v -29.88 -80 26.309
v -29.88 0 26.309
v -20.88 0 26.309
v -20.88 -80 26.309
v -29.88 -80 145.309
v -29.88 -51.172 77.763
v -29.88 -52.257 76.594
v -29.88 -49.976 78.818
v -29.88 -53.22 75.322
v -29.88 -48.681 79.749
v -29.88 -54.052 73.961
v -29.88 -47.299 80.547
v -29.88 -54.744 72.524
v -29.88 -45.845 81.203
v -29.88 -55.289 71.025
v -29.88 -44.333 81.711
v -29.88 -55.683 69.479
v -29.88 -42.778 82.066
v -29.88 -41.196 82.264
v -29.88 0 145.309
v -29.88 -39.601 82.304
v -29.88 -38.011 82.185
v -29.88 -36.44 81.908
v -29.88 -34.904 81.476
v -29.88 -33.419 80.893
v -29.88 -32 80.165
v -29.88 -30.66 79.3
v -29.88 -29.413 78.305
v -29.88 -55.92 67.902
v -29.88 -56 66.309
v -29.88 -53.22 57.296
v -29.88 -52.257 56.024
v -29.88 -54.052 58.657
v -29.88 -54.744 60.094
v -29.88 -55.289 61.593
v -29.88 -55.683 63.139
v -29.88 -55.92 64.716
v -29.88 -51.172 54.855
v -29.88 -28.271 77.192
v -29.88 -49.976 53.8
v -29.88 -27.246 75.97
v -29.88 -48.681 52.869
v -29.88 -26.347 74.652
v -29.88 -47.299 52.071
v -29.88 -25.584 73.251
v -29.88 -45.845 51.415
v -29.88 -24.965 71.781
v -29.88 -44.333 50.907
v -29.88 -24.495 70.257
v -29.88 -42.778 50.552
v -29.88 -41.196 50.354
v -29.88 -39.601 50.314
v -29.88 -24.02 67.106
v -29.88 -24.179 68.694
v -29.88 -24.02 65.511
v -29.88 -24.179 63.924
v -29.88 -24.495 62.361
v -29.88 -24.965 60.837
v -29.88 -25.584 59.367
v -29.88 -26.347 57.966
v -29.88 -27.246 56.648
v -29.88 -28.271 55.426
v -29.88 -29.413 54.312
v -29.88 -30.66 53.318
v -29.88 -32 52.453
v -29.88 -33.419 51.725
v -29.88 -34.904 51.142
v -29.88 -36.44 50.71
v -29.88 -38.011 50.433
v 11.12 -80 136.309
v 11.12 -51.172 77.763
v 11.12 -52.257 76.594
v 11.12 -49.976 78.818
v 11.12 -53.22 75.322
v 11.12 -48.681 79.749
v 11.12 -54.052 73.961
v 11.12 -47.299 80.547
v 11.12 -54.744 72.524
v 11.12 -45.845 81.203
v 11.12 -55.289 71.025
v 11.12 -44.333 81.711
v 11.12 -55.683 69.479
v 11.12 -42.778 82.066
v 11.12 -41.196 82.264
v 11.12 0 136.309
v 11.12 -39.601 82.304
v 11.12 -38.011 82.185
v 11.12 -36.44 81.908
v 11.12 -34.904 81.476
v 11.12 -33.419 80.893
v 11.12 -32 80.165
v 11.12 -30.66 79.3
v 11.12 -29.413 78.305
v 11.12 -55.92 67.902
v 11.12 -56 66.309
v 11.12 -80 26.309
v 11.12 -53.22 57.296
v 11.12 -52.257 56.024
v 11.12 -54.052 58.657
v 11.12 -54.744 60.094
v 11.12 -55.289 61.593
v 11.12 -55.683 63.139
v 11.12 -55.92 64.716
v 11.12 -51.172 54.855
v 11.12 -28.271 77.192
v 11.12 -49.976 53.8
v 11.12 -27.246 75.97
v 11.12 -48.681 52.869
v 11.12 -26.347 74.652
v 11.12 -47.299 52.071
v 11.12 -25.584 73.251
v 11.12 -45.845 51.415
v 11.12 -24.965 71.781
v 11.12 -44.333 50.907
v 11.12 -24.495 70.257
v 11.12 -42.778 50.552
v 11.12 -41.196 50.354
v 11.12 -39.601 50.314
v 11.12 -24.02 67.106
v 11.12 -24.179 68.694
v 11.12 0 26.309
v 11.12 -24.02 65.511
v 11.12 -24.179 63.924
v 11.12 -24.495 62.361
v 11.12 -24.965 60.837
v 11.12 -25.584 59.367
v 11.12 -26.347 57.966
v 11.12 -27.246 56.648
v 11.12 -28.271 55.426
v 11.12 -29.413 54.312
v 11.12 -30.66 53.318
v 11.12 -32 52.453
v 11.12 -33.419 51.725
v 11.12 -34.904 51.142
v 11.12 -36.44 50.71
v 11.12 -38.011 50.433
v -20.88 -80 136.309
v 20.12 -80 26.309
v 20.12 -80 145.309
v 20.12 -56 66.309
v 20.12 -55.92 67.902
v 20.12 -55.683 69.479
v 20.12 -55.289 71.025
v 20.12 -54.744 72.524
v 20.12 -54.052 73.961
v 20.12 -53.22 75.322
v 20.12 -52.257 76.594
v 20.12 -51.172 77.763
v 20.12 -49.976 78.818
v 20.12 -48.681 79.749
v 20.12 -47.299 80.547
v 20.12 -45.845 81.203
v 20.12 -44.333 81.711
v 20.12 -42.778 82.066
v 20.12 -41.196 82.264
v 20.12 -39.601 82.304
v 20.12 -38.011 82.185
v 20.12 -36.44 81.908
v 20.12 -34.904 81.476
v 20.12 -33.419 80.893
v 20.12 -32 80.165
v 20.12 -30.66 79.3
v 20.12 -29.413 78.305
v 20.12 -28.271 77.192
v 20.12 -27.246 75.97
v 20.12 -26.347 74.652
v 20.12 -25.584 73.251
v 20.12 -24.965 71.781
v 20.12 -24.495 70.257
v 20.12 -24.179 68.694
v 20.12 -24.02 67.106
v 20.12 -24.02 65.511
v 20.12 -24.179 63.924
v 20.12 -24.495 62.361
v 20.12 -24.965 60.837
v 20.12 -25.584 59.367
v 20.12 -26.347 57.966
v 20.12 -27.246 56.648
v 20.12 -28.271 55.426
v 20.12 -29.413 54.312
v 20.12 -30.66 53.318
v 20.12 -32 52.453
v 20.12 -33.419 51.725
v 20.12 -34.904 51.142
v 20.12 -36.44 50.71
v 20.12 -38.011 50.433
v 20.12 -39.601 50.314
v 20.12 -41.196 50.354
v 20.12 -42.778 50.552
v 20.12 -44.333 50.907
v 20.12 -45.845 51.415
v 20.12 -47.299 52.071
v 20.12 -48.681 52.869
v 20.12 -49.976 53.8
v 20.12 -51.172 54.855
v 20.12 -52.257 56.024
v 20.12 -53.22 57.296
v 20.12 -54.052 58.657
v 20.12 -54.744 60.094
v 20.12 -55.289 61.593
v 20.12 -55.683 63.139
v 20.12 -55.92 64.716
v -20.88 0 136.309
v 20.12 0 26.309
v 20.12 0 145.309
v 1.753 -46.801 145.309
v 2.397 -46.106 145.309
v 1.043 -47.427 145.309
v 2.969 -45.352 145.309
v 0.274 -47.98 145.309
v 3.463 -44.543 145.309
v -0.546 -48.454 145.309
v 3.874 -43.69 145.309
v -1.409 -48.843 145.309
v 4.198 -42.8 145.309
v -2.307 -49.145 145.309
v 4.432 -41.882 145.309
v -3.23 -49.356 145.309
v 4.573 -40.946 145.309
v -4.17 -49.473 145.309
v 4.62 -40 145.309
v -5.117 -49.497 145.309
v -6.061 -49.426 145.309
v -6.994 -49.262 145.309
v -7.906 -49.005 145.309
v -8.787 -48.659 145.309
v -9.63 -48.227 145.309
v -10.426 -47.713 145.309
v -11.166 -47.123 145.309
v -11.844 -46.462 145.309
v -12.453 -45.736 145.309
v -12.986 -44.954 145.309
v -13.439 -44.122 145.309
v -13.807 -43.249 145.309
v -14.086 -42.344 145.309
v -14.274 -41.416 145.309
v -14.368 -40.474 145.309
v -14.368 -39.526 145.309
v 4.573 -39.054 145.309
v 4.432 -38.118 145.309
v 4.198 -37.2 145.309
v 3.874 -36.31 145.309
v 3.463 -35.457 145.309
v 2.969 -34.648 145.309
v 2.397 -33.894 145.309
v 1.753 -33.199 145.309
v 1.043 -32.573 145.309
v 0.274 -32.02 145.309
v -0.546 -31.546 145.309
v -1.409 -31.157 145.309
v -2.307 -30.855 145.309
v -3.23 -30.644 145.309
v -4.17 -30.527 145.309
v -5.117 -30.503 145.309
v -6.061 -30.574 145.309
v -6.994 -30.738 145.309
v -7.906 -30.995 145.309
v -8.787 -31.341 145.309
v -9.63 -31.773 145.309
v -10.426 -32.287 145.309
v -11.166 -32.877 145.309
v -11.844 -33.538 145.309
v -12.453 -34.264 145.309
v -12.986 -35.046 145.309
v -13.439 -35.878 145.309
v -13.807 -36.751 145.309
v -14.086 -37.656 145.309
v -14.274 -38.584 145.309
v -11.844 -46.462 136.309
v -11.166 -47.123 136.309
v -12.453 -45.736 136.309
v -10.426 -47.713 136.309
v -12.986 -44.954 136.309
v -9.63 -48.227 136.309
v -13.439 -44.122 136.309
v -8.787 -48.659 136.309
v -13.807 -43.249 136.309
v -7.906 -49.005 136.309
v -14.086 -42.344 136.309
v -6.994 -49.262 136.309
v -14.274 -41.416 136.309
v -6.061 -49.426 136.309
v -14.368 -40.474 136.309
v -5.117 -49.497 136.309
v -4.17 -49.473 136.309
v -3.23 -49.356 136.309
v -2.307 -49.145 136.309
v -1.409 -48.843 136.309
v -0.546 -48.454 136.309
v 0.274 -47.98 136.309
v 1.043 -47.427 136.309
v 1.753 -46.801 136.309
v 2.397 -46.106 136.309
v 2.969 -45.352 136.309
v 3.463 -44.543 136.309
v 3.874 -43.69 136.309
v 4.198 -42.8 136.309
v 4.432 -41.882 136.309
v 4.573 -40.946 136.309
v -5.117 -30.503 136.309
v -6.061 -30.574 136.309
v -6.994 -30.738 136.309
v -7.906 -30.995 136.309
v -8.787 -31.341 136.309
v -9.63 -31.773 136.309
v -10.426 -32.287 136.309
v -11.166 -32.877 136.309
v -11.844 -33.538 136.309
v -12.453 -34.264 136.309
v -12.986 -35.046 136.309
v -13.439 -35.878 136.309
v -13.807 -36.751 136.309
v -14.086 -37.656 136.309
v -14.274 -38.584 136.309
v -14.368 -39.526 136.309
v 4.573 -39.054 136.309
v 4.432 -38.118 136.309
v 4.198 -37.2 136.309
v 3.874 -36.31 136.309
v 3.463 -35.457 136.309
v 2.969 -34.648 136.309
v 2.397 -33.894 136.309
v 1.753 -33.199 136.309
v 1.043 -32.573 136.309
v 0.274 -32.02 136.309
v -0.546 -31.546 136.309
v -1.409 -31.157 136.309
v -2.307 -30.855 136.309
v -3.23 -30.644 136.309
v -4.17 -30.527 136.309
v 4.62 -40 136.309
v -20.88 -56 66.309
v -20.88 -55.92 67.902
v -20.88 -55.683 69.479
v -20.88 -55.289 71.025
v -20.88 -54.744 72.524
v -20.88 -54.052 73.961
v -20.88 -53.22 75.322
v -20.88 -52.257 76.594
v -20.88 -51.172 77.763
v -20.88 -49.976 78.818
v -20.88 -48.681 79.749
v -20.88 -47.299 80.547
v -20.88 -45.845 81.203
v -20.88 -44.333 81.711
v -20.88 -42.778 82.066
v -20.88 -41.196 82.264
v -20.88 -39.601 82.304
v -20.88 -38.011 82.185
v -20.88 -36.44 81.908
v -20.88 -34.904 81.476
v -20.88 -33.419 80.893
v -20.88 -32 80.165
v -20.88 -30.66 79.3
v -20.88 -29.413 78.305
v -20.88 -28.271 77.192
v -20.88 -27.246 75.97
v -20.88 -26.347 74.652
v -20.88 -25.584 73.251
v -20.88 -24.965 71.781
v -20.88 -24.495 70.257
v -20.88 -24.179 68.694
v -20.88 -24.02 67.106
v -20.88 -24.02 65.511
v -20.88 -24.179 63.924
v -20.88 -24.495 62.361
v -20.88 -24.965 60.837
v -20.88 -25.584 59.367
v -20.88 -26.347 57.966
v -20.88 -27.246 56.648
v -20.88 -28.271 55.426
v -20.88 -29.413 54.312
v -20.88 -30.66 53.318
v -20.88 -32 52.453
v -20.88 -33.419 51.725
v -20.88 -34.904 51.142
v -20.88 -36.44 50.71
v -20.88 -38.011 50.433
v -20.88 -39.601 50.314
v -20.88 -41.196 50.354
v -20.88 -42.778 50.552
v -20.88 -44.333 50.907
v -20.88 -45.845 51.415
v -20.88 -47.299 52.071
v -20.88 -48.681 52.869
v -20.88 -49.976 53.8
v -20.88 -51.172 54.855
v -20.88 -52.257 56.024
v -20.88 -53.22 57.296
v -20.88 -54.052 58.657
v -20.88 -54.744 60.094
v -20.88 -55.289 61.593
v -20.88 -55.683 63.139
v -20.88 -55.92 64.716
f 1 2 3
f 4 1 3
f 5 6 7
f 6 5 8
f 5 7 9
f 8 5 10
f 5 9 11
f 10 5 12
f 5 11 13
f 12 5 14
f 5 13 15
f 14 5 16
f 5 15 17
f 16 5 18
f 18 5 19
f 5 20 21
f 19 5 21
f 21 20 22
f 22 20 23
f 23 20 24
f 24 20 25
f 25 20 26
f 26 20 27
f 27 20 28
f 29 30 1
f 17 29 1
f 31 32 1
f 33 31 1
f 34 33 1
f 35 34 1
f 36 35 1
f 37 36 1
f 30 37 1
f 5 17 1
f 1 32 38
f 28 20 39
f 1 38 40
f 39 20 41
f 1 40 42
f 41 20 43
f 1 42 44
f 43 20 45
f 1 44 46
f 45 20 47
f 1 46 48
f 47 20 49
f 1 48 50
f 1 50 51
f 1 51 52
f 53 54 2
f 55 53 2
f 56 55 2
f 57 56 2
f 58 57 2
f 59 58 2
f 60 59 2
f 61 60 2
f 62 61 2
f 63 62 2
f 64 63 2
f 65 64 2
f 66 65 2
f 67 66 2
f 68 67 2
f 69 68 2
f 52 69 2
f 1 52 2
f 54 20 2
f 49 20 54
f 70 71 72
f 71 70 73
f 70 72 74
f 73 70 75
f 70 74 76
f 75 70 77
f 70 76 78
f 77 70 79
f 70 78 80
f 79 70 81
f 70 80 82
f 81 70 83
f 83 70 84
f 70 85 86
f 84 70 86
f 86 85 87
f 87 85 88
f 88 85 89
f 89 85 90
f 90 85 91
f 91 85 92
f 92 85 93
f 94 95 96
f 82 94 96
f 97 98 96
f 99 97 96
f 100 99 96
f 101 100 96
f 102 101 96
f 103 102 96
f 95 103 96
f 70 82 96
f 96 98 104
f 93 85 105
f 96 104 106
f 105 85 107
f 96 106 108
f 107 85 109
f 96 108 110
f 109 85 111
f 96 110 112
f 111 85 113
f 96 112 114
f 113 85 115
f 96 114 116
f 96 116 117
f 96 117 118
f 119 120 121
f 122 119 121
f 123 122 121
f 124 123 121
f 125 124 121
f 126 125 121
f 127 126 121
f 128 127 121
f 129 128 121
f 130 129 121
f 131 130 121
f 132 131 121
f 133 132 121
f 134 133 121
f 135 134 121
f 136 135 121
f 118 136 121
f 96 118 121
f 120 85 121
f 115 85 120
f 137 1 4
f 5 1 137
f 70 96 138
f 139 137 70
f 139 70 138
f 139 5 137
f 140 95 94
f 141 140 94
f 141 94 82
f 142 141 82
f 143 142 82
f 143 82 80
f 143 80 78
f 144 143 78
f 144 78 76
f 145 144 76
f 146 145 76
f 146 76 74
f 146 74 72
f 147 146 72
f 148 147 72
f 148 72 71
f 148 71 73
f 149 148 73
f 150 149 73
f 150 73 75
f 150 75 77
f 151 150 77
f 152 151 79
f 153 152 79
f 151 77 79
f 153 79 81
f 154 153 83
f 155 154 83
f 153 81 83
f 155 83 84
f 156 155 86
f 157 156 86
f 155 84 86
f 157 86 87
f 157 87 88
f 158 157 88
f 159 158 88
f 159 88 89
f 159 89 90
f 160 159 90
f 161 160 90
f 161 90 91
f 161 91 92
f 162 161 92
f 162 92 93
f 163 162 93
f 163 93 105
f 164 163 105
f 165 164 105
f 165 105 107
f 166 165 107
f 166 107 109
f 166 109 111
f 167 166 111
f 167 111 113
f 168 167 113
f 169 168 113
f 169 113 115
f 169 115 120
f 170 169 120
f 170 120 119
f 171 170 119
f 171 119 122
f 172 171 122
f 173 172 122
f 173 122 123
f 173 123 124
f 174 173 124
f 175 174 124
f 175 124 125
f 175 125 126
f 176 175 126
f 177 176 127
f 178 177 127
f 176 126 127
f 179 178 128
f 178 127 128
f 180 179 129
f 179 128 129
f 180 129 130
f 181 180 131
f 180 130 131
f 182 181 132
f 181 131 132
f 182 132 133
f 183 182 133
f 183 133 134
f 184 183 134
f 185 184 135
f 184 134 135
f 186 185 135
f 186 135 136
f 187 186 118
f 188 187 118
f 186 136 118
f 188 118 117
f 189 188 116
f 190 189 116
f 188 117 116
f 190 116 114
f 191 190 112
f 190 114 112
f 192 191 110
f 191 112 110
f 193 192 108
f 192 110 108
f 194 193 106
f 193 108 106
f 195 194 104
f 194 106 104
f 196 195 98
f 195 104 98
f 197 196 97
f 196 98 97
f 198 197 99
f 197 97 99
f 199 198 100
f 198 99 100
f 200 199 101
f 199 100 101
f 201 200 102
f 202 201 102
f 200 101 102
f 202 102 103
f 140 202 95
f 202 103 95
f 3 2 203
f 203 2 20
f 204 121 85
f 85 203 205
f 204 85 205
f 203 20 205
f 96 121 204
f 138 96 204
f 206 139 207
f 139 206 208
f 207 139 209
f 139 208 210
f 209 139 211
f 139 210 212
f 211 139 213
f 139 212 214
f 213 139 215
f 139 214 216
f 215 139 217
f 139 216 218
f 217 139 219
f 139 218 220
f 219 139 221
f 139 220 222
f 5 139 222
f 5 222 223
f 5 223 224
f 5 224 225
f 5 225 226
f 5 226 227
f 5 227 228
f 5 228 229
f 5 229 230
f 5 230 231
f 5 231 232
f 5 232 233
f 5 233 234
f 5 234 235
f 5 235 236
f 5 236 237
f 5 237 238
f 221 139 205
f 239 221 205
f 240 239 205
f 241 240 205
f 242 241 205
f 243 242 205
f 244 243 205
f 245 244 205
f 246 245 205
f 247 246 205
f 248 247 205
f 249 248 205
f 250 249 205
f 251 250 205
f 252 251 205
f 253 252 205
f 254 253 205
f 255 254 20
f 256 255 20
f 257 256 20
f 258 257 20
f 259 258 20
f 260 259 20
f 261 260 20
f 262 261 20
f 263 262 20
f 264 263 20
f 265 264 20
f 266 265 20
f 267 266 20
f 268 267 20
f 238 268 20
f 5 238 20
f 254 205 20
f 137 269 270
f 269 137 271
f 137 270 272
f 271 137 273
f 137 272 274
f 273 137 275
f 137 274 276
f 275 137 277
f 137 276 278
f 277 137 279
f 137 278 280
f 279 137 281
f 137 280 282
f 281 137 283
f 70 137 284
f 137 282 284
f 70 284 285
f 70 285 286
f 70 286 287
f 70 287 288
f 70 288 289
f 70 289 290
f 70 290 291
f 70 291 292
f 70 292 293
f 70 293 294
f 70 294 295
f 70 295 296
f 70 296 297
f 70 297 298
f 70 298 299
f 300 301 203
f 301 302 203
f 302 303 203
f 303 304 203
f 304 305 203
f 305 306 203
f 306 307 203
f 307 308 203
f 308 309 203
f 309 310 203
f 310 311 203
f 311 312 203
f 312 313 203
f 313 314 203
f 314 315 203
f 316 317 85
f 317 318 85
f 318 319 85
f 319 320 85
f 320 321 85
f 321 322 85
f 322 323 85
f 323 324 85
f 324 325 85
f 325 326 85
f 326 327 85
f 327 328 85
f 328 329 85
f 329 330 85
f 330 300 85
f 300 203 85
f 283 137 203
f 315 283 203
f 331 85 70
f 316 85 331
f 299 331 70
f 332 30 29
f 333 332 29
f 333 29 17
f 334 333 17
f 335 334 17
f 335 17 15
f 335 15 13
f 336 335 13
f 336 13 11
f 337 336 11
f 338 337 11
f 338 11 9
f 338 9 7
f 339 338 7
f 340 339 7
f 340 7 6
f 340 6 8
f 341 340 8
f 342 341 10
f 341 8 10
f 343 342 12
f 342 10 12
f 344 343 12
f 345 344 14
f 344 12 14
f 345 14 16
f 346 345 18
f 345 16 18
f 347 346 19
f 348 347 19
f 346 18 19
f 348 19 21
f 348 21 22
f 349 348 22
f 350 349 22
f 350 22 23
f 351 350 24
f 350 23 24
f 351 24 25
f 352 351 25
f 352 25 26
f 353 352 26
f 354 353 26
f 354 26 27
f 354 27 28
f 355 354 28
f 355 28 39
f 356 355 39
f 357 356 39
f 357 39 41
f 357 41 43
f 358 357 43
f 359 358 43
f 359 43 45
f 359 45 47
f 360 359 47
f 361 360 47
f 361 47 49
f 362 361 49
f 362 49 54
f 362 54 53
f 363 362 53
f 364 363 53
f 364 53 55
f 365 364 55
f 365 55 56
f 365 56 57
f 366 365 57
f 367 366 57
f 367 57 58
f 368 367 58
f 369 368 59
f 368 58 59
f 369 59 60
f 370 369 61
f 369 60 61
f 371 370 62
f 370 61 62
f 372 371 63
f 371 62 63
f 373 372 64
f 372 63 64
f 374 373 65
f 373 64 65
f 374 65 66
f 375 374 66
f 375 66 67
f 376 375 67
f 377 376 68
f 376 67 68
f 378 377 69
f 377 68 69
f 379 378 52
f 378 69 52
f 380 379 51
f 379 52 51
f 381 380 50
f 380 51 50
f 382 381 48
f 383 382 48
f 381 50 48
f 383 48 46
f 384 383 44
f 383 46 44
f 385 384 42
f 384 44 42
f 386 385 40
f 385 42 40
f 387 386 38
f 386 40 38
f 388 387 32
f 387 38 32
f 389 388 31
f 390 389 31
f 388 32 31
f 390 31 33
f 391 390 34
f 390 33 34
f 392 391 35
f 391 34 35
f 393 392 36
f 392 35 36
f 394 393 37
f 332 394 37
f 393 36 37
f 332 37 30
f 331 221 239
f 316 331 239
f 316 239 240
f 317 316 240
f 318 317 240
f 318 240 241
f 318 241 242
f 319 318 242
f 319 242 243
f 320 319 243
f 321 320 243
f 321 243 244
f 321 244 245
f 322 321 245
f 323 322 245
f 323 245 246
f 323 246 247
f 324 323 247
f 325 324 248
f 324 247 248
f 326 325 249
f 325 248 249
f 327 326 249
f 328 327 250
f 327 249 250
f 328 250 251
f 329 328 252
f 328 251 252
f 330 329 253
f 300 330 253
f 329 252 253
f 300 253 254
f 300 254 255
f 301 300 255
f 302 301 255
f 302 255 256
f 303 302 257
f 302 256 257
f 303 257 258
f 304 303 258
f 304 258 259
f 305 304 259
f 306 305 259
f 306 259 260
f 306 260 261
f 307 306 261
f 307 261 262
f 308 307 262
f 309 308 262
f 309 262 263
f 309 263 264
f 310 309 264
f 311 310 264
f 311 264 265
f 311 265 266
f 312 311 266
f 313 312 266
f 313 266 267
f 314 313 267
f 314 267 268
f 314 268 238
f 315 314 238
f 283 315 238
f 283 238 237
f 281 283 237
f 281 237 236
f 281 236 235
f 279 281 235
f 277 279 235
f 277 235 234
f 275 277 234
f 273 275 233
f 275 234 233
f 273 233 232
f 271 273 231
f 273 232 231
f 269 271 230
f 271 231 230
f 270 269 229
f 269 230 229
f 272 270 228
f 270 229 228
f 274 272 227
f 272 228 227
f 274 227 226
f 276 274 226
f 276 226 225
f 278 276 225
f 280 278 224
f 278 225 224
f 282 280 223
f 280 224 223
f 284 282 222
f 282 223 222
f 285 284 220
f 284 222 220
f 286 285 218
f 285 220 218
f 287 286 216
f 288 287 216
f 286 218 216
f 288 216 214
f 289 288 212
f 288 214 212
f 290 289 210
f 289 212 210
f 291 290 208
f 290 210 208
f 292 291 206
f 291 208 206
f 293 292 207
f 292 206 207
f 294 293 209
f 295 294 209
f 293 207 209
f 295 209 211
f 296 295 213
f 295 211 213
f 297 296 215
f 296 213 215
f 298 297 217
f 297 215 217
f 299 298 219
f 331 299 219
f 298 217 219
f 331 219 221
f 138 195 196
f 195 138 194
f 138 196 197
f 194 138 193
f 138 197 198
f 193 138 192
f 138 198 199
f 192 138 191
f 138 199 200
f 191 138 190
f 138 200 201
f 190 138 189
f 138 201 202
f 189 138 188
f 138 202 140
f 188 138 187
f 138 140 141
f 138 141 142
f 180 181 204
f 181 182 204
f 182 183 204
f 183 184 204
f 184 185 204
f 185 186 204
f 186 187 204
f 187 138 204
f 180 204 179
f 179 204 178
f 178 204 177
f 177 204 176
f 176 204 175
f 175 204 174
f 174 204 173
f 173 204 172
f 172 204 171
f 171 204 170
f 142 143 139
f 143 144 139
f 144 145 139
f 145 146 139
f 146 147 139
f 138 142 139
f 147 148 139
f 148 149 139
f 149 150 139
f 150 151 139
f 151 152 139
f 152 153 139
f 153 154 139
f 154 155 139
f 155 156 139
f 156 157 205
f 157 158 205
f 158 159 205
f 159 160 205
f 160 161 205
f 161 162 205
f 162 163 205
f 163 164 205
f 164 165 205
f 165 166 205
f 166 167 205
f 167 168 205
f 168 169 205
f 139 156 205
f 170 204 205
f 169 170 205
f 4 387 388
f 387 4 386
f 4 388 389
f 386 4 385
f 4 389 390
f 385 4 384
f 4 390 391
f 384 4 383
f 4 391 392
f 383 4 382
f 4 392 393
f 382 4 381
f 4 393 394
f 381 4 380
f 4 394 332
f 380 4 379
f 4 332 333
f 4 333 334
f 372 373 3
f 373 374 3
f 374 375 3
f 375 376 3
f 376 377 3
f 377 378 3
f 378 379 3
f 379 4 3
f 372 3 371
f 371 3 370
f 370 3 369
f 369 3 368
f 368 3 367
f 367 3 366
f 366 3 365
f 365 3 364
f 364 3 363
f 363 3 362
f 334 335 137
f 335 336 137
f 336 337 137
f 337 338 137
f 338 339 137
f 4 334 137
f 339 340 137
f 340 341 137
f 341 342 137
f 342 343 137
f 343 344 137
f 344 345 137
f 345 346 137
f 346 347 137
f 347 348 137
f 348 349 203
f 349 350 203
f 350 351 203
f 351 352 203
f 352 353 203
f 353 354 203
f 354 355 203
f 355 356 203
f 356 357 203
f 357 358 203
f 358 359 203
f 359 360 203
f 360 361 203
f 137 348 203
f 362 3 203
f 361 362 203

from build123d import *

# Parameters (mm, degrees)
F1_DEPTH = 80
F2_R     = 16
F3_DEPTH = 50.001
F4_R     = 9.5
F5_DEPTH = 119.001


with BuildPart() as f1:
    # F0 (on Front) → F1 (new body)
    with BuildSketch(Plane.XZ):
        Polygon((-29.880095, 26.308924), (-20.880095, 26.308924), (-20.880095, 136.308924), (11.119905, 136.308924), (11.119905, 26.308924), (20.119905, 26.308924), (20.119905, 145.308924), (-29.880095, 145.308924), align=None)
    extrude(amount=F1_DEPTH)

    # F2 (on face) → F3 (cut, through all)
    with BuildSketch(Plane(origin=(-29.880095, 0, 0), x_dir=(0, -1, 0), z_dir=(-1, 0, 0))):
        with Locations((40, 66.308924)):
            Circle(F2_R)
    extrude(amount=-F3_DEPTH, mode=Mode.SUBTRACT)

    # F4 (on face) → F5 (cut, through all)
    with BuildSketch(Plane.XY.offset(145.308924)):
        with Locations((-4.880095, -40)):
            Circle(F4_R)
    extrude(amount=-F5_DEPTH, mode=Mode.SUBTRACT)


solid = f1.part
